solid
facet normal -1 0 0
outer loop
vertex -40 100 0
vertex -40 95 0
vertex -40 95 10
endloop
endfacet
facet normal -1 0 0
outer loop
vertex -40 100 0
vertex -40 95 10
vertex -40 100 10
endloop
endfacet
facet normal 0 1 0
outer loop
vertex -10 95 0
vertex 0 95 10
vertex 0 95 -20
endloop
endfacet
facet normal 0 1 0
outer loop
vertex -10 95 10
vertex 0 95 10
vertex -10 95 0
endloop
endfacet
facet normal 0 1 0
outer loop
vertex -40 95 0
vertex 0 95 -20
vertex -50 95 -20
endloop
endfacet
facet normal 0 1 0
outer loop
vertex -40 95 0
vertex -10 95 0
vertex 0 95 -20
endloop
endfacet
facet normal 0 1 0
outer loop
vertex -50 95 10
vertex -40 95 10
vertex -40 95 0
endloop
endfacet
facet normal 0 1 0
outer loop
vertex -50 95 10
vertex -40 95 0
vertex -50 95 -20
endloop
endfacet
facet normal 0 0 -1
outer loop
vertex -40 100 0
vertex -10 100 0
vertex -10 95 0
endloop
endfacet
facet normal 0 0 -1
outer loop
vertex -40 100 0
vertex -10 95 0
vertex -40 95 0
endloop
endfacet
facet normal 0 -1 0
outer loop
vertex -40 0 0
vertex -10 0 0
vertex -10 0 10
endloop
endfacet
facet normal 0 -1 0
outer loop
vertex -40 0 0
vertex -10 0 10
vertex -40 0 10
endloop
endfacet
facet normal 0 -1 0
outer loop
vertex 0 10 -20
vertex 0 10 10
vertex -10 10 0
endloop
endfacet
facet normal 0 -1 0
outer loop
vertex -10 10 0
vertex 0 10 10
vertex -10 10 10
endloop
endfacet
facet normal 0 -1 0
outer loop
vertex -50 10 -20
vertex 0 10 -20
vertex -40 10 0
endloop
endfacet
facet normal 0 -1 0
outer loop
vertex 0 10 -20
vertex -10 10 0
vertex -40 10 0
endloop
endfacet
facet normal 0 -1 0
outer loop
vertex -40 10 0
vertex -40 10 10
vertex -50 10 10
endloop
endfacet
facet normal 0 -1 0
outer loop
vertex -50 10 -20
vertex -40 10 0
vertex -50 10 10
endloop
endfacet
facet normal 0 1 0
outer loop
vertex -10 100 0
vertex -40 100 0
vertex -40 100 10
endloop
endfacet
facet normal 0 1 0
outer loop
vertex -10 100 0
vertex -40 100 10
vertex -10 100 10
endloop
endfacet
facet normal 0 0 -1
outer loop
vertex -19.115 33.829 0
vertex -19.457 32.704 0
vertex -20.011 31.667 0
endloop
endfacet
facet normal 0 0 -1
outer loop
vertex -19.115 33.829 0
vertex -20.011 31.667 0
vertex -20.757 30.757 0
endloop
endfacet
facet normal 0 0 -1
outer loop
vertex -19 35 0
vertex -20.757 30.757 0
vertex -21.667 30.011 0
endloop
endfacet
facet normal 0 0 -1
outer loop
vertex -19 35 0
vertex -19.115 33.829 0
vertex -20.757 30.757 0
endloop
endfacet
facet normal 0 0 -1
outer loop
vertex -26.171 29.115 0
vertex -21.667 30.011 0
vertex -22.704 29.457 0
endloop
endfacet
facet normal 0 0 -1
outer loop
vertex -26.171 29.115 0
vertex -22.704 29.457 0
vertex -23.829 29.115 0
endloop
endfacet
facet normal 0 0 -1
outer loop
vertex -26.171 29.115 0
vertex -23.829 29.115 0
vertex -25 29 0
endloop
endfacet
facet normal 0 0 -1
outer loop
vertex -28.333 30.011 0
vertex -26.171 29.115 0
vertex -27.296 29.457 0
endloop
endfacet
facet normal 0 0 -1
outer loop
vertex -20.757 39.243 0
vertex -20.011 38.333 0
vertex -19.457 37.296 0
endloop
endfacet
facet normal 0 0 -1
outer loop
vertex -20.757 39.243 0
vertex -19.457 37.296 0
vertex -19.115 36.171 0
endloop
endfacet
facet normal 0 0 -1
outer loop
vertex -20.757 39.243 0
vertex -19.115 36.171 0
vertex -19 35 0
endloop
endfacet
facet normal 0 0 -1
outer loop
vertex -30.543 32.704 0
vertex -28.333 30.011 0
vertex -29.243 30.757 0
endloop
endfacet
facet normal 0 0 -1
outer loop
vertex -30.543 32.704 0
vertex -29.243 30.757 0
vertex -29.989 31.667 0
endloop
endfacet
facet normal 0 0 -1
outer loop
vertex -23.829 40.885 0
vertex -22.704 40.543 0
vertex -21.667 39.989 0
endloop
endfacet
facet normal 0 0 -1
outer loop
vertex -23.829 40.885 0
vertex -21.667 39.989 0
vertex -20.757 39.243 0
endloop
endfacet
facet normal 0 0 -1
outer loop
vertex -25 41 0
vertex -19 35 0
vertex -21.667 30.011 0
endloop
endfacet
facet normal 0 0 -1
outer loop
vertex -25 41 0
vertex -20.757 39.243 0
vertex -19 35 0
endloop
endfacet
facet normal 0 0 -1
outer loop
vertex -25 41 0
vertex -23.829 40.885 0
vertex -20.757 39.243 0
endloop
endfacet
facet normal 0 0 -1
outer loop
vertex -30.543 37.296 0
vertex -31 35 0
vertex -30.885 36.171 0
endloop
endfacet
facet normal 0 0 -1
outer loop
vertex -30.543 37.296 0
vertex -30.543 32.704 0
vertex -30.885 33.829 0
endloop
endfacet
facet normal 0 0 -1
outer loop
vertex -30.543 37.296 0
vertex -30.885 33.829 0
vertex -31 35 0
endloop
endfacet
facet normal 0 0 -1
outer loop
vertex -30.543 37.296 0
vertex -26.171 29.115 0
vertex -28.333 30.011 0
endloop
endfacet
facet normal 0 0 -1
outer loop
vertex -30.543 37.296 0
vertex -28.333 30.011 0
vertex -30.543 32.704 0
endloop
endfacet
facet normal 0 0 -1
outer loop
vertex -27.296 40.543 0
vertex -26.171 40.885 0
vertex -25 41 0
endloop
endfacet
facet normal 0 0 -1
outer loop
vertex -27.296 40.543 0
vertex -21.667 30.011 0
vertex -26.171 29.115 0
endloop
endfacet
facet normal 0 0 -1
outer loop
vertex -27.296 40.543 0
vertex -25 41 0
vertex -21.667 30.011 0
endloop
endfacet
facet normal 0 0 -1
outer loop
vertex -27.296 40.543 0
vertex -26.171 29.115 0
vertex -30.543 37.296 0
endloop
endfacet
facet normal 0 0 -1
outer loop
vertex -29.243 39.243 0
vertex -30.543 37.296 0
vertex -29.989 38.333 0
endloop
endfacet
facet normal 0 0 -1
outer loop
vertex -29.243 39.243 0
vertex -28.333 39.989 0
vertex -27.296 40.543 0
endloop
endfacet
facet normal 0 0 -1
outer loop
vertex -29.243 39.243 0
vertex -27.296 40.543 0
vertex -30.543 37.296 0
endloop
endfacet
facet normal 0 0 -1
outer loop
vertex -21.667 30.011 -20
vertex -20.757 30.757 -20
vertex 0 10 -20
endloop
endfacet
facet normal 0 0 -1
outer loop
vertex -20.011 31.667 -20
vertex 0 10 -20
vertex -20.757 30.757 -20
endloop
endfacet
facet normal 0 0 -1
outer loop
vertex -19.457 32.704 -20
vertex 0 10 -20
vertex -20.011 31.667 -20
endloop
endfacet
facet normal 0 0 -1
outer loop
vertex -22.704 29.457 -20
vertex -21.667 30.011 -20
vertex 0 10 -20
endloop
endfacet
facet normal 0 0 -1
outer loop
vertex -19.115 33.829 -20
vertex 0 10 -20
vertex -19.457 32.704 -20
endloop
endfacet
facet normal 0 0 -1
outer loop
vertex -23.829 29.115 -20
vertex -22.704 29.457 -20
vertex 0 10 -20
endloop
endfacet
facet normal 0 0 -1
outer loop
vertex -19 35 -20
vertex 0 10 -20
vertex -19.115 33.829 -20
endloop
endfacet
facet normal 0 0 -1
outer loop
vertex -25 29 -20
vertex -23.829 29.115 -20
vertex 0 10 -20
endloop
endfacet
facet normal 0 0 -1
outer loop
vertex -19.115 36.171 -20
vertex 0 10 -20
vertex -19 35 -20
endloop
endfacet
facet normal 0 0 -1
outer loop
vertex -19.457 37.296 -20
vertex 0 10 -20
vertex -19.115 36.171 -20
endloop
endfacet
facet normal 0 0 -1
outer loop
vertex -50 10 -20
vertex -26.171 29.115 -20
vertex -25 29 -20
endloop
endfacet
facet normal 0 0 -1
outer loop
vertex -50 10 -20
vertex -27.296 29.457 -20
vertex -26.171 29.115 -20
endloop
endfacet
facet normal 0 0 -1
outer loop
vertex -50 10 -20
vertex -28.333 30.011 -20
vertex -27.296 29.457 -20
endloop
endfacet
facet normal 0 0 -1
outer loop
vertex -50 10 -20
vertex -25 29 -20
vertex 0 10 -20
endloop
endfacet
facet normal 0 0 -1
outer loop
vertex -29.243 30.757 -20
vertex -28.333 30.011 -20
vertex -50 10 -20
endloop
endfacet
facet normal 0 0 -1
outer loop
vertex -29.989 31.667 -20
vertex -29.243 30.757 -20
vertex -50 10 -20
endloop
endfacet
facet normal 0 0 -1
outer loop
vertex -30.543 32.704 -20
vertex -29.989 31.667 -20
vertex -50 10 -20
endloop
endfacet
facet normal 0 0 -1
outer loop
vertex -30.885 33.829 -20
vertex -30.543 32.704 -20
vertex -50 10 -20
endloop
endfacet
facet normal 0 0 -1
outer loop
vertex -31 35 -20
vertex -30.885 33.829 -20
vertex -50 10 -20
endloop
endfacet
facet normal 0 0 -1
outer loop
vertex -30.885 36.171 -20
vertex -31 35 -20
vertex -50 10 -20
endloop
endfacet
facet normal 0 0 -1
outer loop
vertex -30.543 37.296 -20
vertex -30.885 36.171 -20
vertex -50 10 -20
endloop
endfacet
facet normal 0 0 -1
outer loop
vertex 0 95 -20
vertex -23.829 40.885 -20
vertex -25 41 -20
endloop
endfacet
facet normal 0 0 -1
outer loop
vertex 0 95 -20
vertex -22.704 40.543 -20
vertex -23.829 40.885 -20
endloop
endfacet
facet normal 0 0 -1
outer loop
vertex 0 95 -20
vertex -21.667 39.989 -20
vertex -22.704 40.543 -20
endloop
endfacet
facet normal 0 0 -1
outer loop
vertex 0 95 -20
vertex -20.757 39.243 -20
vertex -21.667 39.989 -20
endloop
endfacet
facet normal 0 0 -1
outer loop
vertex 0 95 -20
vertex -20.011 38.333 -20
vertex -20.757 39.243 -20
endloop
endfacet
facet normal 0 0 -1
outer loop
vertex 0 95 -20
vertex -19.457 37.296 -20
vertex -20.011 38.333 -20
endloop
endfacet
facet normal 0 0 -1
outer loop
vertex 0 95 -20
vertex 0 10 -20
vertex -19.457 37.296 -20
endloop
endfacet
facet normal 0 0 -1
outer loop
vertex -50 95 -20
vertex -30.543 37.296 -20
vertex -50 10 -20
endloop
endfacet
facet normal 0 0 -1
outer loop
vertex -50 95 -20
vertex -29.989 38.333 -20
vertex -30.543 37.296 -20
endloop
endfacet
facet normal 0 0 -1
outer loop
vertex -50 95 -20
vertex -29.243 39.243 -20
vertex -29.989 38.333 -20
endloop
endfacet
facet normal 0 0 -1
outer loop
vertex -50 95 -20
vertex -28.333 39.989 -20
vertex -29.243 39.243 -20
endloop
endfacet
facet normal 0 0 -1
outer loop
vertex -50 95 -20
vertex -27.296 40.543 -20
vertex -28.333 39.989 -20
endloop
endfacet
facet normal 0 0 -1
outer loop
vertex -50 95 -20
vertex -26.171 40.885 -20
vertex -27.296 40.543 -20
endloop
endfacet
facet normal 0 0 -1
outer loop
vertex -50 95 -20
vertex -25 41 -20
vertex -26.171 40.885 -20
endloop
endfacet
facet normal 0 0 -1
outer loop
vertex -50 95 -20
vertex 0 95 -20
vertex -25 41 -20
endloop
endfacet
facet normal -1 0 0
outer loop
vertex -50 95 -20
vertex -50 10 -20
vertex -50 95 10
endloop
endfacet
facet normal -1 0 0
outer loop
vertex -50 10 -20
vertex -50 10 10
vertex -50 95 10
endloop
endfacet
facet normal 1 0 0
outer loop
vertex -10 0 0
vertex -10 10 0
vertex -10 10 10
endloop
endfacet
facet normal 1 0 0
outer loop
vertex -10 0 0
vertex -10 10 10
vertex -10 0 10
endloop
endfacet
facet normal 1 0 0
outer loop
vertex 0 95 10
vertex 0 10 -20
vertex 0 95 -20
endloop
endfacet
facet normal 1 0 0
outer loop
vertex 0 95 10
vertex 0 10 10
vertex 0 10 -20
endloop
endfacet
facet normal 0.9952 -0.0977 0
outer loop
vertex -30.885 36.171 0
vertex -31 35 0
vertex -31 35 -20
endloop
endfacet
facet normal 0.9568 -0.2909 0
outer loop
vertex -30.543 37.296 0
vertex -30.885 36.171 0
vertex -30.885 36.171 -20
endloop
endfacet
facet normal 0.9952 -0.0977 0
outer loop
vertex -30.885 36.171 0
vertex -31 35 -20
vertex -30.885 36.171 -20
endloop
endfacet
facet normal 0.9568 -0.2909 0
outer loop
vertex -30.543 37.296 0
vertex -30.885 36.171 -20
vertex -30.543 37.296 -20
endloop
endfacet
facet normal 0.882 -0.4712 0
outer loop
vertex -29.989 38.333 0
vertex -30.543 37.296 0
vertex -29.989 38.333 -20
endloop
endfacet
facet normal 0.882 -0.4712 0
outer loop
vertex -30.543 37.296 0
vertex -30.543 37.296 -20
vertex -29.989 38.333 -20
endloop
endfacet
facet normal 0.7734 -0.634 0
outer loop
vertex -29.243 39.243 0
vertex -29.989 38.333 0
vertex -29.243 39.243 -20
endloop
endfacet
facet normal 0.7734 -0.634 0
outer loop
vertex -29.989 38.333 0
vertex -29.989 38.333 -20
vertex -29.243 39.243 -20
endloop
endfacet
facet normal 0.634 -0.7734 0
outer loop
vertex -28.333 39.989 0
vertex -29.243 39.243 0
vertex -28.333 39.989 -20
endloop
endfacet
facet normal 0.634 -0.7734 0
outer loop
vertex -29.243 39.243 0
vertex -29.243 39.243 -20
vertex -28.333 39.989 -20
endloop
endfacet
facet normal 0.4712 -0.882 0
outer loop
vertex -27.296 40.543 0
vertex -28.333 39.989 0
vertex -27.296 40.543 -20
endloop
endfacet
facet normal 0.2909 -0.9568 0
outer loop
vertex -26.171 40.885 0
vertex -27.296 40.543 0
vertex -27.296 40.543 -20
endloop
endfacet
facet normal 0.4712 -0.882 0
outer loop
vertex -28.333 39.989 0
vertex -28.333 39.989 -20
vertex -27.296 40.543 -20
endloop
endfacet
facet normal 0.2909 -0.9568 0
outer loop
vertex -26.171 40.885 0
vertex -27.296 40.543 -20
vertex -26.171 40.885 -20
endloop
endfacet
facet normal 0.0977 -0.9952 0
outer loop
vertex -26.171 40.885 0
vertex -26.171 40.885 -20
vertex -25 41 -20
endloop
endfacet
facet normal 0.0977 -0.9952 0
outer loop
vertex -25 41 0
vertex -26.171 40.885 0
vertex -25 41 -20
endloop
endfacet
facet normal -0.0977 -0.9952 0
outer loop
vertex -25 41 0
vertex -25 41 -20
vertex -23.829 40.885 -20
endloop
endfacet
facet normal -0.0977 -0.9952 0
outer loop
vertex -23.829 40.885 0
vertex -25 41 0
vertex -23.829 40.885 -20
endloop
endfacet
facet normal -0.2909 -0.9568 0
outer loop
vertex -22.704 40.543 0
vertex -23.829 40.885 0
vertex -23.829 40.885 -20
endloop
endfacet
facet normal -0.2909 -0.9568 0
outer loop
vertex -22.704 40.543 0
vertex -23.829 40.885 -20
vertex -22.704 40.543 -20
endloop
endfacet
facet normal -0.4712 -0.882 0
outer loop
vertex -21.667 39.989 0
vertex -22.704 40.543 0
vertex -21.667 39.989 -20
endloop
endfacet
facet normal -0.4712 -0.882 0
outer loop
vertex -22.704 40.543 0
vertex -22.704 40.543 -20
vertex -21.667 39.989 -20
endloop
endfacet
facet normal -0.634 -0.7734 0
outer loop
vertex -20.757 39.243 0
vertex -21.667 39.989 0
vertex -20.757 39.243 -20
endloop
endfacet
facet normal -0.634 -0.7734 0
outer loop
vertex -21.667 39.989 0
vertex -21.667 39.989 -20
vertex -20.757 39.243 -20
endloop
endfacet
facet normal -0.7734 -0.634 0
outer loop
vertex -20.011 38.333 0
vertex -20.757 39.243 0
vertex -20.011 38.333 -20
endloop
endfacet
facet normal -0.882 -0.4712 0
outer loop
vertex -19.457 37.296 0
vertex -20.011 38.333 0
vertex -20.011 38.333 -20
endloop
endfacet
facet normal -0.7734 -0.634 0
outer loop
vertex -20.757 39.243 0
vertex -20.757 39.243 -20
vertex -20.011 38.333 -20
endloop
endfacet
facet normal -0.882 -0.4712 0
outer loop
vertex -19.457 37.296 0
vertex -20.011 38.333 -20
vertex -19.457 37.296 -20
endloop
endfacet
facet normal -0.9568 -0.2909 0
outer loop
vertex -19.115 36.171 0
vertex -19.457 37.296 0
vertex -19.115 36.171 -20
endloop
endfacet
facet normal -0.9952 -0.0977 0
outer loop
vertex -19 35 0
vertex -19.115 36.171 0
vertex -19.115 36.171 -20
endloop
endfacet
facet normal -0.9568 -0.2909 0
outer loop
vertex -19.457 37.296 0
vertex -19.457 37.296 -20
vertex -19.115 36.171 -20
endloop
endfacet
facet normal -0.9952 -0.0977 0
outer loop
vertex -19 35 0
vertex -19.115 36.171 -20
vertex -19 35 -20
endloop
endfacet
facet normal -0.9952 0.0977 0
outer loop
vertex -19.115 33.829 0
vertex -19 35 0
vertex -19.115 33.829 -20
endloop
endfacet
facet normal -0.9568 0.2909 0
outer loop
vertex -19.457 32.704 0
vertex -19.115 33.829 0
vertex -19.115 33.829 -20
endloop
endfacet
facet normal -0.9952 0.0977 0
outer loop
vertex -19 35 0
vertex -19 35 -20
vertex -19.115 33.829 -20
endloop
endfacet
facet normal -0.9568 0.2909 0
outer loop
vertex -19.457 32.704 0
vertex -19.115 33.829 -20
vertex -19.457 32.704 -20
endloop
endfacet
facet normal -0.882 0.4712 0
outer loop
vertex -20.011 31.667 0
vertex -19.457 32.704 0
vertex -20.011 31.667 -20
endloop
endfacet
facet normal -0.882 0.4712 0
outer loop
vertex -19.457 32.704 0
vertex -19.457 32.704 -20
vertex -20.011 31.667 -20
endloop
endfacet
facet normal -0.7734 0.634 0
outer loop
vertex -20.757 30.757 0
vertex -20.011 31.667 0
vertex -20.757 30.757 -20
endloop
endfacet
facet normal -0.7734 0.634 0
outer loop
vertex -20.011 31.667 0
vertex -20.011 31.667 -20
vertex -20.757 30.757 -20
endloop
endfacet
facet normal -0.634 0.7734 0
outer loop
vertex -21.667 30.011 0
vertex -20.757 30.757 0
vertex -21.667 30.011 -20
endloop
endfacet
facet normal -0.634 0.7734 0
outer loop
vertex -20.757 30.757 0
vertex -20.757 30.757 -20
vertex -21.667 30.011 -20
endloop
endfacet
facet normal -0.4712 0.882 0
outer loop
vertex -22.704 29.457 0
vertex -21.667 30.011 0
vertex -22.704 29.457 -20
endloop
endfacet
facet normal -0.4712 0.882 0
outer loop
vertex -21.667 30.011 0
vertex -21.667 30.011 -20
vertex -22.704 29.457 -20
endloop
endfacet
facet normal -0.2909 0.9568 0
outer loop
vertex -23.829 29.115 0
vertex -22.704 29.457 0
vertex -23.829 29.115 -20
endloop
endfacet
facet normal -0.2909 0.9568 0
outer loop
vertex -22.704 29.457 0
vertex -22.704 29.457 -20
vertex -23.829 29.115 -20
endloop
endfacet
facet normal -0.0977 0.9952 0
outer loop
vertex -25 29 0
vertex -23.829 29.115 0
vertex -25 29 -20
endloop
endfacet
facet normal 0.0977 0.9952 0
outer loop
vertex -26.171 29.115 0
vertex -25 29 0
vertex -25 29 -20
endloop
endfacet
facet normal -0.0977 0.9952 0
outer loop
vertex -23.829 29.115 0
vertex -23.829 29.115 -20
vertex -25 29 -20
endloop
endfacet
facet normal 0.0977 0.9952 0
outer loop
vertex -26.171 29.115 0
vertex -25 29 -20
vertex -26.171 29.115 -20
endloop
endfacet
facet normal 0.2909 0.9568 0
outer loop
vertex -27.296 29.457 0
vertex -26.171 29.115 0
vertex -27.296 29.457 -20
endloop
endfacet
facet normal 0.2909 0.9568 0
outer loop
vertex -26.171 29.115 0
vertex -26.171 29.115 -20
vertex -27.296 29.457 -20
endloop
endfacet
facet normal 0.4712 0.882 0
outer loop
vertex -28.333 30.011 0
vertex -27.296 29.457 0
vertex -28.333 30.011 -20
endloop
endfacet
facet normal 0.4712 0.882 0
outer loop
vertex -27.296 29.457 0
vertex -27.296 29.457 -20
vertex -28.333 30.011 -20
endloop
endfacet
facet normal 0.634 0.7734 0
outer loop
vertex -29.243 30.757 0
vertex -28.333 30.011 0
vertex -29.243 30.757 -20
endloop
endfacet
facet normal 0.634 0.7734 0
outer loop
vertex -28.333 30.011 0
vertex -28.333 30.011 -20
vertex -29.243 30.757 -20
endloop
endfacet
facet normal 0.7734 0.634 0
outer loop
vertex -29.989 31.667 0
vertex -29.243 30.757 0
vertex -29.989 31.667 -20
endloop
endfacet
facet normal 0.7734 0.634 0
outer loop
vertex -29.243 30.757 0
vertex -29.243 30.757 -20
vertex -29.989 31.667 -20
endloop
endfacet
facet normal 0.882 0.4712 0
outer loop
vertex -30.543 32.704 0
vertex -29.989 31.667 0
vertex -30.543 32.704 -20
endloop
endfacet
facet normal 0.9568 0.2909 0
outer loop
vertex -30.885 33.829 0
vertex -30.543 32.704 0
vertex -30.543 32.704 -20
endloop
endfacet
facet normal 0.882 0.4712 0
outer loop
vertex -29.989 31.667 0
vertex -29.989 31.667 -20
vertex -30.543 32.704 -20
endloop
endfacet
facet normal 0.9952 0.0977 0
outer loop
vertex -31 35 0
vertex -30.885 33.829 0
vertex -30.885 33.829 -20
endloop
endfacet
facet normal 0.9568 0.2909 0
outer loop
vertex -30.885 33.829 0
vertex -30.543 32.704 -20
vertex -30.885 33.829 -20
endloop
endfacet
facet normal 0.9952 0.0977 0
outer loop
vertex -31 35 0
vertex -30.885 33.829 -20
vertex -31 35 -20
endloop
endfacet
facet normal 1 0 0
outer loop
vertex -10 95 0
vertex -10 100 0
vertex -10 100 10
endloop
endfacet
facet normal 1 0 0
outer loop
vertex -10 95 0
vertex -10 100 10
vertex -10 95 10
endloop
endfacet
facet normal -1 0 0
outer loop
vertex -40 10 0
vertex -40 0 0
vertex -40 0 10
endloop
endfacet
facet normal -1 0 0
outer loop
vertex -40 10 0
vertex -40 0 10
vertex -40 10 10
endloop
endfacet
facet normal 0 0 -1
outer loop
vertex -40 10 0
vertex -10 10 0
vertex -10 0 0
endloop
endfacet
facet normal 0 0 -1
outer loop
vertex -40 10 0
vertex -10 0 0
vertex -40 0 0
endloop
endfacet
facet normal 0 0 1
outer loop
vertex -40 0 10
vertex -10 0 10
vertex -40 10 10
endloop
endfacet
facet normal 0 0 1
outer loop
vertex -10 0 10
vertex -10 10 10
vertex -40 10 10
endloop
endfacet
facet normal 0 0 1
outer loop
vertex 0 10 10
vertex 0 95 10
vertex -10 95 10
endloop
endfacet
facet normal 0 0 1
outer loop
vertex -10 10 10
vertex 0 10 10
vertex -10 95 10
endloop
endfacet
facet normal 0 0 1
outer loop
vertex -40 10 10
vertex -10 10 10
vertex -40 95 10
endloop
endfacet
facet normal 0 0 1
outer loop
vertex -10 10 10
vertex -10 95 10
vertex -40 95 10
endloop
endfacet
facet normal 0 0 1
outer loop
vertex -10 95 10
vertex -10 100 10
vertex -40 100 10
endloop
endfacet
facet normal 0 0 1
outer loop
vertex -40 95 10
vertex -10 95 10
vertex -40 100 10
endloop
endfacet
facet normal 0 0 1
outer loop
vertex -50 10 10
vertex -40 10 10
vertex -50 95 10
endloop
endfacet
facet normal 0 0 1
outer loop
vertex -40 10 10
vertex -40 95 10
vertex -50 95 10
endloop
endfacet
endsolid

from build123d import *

# Parameters (mm, degrees)
BOSS_EXTRUDE1_DEPTH = 10
SKETCH2_W           = 50
SKETCH2_H           = 85
BOSS_EXTRUDE2_DEPTH = 20
SKETCH3_R           = 6
CUT_EXTRUDE1_DEPTH  = 20


with BuildPart() as part:
    # Sketch1 → Boss-Extrude1 (new body)
    with BuildSketch(Plane.XY):
        Polygon((-10, 0), (-40, 0), (-40, 10), (-50, 10), (-50, 95), (-40, 95), (-40, 100), (-10, 100), (-10, 95), (0, 95), (0, 10), (-10, 10), align=None)
    extrude(amount=BOSS_EXTRUDE1_DEPTH)

    # Sketch2 → Boss-Extrude2 (add)
    with BuildSketch(Plane(origin=(0, 0, 0), x_dir=(-1, 0, 0), z_dir=(0, 0, -1))):
        with Locations((25, 52.5)):
            Rectangle(SKETCH2_W, SKETCH2_H)
    extrude(amount=BOSS_EXTRUDE2_DEPTH)

    # Sketch3 → Cut-Extrude1 (cut)
    with BuildSketch(Plane(origin=(0, 0, -20), x_dir=(-1, 0, 0), z_dir=(0, 0, -1))):
        with Locations((25, 35)):
            Circle(SKETCH3_R)
    extrude(amount=-CUT_EXTRUDE1_DEPTH, mode=Mode.SUBTRACT)


solid = part.part
